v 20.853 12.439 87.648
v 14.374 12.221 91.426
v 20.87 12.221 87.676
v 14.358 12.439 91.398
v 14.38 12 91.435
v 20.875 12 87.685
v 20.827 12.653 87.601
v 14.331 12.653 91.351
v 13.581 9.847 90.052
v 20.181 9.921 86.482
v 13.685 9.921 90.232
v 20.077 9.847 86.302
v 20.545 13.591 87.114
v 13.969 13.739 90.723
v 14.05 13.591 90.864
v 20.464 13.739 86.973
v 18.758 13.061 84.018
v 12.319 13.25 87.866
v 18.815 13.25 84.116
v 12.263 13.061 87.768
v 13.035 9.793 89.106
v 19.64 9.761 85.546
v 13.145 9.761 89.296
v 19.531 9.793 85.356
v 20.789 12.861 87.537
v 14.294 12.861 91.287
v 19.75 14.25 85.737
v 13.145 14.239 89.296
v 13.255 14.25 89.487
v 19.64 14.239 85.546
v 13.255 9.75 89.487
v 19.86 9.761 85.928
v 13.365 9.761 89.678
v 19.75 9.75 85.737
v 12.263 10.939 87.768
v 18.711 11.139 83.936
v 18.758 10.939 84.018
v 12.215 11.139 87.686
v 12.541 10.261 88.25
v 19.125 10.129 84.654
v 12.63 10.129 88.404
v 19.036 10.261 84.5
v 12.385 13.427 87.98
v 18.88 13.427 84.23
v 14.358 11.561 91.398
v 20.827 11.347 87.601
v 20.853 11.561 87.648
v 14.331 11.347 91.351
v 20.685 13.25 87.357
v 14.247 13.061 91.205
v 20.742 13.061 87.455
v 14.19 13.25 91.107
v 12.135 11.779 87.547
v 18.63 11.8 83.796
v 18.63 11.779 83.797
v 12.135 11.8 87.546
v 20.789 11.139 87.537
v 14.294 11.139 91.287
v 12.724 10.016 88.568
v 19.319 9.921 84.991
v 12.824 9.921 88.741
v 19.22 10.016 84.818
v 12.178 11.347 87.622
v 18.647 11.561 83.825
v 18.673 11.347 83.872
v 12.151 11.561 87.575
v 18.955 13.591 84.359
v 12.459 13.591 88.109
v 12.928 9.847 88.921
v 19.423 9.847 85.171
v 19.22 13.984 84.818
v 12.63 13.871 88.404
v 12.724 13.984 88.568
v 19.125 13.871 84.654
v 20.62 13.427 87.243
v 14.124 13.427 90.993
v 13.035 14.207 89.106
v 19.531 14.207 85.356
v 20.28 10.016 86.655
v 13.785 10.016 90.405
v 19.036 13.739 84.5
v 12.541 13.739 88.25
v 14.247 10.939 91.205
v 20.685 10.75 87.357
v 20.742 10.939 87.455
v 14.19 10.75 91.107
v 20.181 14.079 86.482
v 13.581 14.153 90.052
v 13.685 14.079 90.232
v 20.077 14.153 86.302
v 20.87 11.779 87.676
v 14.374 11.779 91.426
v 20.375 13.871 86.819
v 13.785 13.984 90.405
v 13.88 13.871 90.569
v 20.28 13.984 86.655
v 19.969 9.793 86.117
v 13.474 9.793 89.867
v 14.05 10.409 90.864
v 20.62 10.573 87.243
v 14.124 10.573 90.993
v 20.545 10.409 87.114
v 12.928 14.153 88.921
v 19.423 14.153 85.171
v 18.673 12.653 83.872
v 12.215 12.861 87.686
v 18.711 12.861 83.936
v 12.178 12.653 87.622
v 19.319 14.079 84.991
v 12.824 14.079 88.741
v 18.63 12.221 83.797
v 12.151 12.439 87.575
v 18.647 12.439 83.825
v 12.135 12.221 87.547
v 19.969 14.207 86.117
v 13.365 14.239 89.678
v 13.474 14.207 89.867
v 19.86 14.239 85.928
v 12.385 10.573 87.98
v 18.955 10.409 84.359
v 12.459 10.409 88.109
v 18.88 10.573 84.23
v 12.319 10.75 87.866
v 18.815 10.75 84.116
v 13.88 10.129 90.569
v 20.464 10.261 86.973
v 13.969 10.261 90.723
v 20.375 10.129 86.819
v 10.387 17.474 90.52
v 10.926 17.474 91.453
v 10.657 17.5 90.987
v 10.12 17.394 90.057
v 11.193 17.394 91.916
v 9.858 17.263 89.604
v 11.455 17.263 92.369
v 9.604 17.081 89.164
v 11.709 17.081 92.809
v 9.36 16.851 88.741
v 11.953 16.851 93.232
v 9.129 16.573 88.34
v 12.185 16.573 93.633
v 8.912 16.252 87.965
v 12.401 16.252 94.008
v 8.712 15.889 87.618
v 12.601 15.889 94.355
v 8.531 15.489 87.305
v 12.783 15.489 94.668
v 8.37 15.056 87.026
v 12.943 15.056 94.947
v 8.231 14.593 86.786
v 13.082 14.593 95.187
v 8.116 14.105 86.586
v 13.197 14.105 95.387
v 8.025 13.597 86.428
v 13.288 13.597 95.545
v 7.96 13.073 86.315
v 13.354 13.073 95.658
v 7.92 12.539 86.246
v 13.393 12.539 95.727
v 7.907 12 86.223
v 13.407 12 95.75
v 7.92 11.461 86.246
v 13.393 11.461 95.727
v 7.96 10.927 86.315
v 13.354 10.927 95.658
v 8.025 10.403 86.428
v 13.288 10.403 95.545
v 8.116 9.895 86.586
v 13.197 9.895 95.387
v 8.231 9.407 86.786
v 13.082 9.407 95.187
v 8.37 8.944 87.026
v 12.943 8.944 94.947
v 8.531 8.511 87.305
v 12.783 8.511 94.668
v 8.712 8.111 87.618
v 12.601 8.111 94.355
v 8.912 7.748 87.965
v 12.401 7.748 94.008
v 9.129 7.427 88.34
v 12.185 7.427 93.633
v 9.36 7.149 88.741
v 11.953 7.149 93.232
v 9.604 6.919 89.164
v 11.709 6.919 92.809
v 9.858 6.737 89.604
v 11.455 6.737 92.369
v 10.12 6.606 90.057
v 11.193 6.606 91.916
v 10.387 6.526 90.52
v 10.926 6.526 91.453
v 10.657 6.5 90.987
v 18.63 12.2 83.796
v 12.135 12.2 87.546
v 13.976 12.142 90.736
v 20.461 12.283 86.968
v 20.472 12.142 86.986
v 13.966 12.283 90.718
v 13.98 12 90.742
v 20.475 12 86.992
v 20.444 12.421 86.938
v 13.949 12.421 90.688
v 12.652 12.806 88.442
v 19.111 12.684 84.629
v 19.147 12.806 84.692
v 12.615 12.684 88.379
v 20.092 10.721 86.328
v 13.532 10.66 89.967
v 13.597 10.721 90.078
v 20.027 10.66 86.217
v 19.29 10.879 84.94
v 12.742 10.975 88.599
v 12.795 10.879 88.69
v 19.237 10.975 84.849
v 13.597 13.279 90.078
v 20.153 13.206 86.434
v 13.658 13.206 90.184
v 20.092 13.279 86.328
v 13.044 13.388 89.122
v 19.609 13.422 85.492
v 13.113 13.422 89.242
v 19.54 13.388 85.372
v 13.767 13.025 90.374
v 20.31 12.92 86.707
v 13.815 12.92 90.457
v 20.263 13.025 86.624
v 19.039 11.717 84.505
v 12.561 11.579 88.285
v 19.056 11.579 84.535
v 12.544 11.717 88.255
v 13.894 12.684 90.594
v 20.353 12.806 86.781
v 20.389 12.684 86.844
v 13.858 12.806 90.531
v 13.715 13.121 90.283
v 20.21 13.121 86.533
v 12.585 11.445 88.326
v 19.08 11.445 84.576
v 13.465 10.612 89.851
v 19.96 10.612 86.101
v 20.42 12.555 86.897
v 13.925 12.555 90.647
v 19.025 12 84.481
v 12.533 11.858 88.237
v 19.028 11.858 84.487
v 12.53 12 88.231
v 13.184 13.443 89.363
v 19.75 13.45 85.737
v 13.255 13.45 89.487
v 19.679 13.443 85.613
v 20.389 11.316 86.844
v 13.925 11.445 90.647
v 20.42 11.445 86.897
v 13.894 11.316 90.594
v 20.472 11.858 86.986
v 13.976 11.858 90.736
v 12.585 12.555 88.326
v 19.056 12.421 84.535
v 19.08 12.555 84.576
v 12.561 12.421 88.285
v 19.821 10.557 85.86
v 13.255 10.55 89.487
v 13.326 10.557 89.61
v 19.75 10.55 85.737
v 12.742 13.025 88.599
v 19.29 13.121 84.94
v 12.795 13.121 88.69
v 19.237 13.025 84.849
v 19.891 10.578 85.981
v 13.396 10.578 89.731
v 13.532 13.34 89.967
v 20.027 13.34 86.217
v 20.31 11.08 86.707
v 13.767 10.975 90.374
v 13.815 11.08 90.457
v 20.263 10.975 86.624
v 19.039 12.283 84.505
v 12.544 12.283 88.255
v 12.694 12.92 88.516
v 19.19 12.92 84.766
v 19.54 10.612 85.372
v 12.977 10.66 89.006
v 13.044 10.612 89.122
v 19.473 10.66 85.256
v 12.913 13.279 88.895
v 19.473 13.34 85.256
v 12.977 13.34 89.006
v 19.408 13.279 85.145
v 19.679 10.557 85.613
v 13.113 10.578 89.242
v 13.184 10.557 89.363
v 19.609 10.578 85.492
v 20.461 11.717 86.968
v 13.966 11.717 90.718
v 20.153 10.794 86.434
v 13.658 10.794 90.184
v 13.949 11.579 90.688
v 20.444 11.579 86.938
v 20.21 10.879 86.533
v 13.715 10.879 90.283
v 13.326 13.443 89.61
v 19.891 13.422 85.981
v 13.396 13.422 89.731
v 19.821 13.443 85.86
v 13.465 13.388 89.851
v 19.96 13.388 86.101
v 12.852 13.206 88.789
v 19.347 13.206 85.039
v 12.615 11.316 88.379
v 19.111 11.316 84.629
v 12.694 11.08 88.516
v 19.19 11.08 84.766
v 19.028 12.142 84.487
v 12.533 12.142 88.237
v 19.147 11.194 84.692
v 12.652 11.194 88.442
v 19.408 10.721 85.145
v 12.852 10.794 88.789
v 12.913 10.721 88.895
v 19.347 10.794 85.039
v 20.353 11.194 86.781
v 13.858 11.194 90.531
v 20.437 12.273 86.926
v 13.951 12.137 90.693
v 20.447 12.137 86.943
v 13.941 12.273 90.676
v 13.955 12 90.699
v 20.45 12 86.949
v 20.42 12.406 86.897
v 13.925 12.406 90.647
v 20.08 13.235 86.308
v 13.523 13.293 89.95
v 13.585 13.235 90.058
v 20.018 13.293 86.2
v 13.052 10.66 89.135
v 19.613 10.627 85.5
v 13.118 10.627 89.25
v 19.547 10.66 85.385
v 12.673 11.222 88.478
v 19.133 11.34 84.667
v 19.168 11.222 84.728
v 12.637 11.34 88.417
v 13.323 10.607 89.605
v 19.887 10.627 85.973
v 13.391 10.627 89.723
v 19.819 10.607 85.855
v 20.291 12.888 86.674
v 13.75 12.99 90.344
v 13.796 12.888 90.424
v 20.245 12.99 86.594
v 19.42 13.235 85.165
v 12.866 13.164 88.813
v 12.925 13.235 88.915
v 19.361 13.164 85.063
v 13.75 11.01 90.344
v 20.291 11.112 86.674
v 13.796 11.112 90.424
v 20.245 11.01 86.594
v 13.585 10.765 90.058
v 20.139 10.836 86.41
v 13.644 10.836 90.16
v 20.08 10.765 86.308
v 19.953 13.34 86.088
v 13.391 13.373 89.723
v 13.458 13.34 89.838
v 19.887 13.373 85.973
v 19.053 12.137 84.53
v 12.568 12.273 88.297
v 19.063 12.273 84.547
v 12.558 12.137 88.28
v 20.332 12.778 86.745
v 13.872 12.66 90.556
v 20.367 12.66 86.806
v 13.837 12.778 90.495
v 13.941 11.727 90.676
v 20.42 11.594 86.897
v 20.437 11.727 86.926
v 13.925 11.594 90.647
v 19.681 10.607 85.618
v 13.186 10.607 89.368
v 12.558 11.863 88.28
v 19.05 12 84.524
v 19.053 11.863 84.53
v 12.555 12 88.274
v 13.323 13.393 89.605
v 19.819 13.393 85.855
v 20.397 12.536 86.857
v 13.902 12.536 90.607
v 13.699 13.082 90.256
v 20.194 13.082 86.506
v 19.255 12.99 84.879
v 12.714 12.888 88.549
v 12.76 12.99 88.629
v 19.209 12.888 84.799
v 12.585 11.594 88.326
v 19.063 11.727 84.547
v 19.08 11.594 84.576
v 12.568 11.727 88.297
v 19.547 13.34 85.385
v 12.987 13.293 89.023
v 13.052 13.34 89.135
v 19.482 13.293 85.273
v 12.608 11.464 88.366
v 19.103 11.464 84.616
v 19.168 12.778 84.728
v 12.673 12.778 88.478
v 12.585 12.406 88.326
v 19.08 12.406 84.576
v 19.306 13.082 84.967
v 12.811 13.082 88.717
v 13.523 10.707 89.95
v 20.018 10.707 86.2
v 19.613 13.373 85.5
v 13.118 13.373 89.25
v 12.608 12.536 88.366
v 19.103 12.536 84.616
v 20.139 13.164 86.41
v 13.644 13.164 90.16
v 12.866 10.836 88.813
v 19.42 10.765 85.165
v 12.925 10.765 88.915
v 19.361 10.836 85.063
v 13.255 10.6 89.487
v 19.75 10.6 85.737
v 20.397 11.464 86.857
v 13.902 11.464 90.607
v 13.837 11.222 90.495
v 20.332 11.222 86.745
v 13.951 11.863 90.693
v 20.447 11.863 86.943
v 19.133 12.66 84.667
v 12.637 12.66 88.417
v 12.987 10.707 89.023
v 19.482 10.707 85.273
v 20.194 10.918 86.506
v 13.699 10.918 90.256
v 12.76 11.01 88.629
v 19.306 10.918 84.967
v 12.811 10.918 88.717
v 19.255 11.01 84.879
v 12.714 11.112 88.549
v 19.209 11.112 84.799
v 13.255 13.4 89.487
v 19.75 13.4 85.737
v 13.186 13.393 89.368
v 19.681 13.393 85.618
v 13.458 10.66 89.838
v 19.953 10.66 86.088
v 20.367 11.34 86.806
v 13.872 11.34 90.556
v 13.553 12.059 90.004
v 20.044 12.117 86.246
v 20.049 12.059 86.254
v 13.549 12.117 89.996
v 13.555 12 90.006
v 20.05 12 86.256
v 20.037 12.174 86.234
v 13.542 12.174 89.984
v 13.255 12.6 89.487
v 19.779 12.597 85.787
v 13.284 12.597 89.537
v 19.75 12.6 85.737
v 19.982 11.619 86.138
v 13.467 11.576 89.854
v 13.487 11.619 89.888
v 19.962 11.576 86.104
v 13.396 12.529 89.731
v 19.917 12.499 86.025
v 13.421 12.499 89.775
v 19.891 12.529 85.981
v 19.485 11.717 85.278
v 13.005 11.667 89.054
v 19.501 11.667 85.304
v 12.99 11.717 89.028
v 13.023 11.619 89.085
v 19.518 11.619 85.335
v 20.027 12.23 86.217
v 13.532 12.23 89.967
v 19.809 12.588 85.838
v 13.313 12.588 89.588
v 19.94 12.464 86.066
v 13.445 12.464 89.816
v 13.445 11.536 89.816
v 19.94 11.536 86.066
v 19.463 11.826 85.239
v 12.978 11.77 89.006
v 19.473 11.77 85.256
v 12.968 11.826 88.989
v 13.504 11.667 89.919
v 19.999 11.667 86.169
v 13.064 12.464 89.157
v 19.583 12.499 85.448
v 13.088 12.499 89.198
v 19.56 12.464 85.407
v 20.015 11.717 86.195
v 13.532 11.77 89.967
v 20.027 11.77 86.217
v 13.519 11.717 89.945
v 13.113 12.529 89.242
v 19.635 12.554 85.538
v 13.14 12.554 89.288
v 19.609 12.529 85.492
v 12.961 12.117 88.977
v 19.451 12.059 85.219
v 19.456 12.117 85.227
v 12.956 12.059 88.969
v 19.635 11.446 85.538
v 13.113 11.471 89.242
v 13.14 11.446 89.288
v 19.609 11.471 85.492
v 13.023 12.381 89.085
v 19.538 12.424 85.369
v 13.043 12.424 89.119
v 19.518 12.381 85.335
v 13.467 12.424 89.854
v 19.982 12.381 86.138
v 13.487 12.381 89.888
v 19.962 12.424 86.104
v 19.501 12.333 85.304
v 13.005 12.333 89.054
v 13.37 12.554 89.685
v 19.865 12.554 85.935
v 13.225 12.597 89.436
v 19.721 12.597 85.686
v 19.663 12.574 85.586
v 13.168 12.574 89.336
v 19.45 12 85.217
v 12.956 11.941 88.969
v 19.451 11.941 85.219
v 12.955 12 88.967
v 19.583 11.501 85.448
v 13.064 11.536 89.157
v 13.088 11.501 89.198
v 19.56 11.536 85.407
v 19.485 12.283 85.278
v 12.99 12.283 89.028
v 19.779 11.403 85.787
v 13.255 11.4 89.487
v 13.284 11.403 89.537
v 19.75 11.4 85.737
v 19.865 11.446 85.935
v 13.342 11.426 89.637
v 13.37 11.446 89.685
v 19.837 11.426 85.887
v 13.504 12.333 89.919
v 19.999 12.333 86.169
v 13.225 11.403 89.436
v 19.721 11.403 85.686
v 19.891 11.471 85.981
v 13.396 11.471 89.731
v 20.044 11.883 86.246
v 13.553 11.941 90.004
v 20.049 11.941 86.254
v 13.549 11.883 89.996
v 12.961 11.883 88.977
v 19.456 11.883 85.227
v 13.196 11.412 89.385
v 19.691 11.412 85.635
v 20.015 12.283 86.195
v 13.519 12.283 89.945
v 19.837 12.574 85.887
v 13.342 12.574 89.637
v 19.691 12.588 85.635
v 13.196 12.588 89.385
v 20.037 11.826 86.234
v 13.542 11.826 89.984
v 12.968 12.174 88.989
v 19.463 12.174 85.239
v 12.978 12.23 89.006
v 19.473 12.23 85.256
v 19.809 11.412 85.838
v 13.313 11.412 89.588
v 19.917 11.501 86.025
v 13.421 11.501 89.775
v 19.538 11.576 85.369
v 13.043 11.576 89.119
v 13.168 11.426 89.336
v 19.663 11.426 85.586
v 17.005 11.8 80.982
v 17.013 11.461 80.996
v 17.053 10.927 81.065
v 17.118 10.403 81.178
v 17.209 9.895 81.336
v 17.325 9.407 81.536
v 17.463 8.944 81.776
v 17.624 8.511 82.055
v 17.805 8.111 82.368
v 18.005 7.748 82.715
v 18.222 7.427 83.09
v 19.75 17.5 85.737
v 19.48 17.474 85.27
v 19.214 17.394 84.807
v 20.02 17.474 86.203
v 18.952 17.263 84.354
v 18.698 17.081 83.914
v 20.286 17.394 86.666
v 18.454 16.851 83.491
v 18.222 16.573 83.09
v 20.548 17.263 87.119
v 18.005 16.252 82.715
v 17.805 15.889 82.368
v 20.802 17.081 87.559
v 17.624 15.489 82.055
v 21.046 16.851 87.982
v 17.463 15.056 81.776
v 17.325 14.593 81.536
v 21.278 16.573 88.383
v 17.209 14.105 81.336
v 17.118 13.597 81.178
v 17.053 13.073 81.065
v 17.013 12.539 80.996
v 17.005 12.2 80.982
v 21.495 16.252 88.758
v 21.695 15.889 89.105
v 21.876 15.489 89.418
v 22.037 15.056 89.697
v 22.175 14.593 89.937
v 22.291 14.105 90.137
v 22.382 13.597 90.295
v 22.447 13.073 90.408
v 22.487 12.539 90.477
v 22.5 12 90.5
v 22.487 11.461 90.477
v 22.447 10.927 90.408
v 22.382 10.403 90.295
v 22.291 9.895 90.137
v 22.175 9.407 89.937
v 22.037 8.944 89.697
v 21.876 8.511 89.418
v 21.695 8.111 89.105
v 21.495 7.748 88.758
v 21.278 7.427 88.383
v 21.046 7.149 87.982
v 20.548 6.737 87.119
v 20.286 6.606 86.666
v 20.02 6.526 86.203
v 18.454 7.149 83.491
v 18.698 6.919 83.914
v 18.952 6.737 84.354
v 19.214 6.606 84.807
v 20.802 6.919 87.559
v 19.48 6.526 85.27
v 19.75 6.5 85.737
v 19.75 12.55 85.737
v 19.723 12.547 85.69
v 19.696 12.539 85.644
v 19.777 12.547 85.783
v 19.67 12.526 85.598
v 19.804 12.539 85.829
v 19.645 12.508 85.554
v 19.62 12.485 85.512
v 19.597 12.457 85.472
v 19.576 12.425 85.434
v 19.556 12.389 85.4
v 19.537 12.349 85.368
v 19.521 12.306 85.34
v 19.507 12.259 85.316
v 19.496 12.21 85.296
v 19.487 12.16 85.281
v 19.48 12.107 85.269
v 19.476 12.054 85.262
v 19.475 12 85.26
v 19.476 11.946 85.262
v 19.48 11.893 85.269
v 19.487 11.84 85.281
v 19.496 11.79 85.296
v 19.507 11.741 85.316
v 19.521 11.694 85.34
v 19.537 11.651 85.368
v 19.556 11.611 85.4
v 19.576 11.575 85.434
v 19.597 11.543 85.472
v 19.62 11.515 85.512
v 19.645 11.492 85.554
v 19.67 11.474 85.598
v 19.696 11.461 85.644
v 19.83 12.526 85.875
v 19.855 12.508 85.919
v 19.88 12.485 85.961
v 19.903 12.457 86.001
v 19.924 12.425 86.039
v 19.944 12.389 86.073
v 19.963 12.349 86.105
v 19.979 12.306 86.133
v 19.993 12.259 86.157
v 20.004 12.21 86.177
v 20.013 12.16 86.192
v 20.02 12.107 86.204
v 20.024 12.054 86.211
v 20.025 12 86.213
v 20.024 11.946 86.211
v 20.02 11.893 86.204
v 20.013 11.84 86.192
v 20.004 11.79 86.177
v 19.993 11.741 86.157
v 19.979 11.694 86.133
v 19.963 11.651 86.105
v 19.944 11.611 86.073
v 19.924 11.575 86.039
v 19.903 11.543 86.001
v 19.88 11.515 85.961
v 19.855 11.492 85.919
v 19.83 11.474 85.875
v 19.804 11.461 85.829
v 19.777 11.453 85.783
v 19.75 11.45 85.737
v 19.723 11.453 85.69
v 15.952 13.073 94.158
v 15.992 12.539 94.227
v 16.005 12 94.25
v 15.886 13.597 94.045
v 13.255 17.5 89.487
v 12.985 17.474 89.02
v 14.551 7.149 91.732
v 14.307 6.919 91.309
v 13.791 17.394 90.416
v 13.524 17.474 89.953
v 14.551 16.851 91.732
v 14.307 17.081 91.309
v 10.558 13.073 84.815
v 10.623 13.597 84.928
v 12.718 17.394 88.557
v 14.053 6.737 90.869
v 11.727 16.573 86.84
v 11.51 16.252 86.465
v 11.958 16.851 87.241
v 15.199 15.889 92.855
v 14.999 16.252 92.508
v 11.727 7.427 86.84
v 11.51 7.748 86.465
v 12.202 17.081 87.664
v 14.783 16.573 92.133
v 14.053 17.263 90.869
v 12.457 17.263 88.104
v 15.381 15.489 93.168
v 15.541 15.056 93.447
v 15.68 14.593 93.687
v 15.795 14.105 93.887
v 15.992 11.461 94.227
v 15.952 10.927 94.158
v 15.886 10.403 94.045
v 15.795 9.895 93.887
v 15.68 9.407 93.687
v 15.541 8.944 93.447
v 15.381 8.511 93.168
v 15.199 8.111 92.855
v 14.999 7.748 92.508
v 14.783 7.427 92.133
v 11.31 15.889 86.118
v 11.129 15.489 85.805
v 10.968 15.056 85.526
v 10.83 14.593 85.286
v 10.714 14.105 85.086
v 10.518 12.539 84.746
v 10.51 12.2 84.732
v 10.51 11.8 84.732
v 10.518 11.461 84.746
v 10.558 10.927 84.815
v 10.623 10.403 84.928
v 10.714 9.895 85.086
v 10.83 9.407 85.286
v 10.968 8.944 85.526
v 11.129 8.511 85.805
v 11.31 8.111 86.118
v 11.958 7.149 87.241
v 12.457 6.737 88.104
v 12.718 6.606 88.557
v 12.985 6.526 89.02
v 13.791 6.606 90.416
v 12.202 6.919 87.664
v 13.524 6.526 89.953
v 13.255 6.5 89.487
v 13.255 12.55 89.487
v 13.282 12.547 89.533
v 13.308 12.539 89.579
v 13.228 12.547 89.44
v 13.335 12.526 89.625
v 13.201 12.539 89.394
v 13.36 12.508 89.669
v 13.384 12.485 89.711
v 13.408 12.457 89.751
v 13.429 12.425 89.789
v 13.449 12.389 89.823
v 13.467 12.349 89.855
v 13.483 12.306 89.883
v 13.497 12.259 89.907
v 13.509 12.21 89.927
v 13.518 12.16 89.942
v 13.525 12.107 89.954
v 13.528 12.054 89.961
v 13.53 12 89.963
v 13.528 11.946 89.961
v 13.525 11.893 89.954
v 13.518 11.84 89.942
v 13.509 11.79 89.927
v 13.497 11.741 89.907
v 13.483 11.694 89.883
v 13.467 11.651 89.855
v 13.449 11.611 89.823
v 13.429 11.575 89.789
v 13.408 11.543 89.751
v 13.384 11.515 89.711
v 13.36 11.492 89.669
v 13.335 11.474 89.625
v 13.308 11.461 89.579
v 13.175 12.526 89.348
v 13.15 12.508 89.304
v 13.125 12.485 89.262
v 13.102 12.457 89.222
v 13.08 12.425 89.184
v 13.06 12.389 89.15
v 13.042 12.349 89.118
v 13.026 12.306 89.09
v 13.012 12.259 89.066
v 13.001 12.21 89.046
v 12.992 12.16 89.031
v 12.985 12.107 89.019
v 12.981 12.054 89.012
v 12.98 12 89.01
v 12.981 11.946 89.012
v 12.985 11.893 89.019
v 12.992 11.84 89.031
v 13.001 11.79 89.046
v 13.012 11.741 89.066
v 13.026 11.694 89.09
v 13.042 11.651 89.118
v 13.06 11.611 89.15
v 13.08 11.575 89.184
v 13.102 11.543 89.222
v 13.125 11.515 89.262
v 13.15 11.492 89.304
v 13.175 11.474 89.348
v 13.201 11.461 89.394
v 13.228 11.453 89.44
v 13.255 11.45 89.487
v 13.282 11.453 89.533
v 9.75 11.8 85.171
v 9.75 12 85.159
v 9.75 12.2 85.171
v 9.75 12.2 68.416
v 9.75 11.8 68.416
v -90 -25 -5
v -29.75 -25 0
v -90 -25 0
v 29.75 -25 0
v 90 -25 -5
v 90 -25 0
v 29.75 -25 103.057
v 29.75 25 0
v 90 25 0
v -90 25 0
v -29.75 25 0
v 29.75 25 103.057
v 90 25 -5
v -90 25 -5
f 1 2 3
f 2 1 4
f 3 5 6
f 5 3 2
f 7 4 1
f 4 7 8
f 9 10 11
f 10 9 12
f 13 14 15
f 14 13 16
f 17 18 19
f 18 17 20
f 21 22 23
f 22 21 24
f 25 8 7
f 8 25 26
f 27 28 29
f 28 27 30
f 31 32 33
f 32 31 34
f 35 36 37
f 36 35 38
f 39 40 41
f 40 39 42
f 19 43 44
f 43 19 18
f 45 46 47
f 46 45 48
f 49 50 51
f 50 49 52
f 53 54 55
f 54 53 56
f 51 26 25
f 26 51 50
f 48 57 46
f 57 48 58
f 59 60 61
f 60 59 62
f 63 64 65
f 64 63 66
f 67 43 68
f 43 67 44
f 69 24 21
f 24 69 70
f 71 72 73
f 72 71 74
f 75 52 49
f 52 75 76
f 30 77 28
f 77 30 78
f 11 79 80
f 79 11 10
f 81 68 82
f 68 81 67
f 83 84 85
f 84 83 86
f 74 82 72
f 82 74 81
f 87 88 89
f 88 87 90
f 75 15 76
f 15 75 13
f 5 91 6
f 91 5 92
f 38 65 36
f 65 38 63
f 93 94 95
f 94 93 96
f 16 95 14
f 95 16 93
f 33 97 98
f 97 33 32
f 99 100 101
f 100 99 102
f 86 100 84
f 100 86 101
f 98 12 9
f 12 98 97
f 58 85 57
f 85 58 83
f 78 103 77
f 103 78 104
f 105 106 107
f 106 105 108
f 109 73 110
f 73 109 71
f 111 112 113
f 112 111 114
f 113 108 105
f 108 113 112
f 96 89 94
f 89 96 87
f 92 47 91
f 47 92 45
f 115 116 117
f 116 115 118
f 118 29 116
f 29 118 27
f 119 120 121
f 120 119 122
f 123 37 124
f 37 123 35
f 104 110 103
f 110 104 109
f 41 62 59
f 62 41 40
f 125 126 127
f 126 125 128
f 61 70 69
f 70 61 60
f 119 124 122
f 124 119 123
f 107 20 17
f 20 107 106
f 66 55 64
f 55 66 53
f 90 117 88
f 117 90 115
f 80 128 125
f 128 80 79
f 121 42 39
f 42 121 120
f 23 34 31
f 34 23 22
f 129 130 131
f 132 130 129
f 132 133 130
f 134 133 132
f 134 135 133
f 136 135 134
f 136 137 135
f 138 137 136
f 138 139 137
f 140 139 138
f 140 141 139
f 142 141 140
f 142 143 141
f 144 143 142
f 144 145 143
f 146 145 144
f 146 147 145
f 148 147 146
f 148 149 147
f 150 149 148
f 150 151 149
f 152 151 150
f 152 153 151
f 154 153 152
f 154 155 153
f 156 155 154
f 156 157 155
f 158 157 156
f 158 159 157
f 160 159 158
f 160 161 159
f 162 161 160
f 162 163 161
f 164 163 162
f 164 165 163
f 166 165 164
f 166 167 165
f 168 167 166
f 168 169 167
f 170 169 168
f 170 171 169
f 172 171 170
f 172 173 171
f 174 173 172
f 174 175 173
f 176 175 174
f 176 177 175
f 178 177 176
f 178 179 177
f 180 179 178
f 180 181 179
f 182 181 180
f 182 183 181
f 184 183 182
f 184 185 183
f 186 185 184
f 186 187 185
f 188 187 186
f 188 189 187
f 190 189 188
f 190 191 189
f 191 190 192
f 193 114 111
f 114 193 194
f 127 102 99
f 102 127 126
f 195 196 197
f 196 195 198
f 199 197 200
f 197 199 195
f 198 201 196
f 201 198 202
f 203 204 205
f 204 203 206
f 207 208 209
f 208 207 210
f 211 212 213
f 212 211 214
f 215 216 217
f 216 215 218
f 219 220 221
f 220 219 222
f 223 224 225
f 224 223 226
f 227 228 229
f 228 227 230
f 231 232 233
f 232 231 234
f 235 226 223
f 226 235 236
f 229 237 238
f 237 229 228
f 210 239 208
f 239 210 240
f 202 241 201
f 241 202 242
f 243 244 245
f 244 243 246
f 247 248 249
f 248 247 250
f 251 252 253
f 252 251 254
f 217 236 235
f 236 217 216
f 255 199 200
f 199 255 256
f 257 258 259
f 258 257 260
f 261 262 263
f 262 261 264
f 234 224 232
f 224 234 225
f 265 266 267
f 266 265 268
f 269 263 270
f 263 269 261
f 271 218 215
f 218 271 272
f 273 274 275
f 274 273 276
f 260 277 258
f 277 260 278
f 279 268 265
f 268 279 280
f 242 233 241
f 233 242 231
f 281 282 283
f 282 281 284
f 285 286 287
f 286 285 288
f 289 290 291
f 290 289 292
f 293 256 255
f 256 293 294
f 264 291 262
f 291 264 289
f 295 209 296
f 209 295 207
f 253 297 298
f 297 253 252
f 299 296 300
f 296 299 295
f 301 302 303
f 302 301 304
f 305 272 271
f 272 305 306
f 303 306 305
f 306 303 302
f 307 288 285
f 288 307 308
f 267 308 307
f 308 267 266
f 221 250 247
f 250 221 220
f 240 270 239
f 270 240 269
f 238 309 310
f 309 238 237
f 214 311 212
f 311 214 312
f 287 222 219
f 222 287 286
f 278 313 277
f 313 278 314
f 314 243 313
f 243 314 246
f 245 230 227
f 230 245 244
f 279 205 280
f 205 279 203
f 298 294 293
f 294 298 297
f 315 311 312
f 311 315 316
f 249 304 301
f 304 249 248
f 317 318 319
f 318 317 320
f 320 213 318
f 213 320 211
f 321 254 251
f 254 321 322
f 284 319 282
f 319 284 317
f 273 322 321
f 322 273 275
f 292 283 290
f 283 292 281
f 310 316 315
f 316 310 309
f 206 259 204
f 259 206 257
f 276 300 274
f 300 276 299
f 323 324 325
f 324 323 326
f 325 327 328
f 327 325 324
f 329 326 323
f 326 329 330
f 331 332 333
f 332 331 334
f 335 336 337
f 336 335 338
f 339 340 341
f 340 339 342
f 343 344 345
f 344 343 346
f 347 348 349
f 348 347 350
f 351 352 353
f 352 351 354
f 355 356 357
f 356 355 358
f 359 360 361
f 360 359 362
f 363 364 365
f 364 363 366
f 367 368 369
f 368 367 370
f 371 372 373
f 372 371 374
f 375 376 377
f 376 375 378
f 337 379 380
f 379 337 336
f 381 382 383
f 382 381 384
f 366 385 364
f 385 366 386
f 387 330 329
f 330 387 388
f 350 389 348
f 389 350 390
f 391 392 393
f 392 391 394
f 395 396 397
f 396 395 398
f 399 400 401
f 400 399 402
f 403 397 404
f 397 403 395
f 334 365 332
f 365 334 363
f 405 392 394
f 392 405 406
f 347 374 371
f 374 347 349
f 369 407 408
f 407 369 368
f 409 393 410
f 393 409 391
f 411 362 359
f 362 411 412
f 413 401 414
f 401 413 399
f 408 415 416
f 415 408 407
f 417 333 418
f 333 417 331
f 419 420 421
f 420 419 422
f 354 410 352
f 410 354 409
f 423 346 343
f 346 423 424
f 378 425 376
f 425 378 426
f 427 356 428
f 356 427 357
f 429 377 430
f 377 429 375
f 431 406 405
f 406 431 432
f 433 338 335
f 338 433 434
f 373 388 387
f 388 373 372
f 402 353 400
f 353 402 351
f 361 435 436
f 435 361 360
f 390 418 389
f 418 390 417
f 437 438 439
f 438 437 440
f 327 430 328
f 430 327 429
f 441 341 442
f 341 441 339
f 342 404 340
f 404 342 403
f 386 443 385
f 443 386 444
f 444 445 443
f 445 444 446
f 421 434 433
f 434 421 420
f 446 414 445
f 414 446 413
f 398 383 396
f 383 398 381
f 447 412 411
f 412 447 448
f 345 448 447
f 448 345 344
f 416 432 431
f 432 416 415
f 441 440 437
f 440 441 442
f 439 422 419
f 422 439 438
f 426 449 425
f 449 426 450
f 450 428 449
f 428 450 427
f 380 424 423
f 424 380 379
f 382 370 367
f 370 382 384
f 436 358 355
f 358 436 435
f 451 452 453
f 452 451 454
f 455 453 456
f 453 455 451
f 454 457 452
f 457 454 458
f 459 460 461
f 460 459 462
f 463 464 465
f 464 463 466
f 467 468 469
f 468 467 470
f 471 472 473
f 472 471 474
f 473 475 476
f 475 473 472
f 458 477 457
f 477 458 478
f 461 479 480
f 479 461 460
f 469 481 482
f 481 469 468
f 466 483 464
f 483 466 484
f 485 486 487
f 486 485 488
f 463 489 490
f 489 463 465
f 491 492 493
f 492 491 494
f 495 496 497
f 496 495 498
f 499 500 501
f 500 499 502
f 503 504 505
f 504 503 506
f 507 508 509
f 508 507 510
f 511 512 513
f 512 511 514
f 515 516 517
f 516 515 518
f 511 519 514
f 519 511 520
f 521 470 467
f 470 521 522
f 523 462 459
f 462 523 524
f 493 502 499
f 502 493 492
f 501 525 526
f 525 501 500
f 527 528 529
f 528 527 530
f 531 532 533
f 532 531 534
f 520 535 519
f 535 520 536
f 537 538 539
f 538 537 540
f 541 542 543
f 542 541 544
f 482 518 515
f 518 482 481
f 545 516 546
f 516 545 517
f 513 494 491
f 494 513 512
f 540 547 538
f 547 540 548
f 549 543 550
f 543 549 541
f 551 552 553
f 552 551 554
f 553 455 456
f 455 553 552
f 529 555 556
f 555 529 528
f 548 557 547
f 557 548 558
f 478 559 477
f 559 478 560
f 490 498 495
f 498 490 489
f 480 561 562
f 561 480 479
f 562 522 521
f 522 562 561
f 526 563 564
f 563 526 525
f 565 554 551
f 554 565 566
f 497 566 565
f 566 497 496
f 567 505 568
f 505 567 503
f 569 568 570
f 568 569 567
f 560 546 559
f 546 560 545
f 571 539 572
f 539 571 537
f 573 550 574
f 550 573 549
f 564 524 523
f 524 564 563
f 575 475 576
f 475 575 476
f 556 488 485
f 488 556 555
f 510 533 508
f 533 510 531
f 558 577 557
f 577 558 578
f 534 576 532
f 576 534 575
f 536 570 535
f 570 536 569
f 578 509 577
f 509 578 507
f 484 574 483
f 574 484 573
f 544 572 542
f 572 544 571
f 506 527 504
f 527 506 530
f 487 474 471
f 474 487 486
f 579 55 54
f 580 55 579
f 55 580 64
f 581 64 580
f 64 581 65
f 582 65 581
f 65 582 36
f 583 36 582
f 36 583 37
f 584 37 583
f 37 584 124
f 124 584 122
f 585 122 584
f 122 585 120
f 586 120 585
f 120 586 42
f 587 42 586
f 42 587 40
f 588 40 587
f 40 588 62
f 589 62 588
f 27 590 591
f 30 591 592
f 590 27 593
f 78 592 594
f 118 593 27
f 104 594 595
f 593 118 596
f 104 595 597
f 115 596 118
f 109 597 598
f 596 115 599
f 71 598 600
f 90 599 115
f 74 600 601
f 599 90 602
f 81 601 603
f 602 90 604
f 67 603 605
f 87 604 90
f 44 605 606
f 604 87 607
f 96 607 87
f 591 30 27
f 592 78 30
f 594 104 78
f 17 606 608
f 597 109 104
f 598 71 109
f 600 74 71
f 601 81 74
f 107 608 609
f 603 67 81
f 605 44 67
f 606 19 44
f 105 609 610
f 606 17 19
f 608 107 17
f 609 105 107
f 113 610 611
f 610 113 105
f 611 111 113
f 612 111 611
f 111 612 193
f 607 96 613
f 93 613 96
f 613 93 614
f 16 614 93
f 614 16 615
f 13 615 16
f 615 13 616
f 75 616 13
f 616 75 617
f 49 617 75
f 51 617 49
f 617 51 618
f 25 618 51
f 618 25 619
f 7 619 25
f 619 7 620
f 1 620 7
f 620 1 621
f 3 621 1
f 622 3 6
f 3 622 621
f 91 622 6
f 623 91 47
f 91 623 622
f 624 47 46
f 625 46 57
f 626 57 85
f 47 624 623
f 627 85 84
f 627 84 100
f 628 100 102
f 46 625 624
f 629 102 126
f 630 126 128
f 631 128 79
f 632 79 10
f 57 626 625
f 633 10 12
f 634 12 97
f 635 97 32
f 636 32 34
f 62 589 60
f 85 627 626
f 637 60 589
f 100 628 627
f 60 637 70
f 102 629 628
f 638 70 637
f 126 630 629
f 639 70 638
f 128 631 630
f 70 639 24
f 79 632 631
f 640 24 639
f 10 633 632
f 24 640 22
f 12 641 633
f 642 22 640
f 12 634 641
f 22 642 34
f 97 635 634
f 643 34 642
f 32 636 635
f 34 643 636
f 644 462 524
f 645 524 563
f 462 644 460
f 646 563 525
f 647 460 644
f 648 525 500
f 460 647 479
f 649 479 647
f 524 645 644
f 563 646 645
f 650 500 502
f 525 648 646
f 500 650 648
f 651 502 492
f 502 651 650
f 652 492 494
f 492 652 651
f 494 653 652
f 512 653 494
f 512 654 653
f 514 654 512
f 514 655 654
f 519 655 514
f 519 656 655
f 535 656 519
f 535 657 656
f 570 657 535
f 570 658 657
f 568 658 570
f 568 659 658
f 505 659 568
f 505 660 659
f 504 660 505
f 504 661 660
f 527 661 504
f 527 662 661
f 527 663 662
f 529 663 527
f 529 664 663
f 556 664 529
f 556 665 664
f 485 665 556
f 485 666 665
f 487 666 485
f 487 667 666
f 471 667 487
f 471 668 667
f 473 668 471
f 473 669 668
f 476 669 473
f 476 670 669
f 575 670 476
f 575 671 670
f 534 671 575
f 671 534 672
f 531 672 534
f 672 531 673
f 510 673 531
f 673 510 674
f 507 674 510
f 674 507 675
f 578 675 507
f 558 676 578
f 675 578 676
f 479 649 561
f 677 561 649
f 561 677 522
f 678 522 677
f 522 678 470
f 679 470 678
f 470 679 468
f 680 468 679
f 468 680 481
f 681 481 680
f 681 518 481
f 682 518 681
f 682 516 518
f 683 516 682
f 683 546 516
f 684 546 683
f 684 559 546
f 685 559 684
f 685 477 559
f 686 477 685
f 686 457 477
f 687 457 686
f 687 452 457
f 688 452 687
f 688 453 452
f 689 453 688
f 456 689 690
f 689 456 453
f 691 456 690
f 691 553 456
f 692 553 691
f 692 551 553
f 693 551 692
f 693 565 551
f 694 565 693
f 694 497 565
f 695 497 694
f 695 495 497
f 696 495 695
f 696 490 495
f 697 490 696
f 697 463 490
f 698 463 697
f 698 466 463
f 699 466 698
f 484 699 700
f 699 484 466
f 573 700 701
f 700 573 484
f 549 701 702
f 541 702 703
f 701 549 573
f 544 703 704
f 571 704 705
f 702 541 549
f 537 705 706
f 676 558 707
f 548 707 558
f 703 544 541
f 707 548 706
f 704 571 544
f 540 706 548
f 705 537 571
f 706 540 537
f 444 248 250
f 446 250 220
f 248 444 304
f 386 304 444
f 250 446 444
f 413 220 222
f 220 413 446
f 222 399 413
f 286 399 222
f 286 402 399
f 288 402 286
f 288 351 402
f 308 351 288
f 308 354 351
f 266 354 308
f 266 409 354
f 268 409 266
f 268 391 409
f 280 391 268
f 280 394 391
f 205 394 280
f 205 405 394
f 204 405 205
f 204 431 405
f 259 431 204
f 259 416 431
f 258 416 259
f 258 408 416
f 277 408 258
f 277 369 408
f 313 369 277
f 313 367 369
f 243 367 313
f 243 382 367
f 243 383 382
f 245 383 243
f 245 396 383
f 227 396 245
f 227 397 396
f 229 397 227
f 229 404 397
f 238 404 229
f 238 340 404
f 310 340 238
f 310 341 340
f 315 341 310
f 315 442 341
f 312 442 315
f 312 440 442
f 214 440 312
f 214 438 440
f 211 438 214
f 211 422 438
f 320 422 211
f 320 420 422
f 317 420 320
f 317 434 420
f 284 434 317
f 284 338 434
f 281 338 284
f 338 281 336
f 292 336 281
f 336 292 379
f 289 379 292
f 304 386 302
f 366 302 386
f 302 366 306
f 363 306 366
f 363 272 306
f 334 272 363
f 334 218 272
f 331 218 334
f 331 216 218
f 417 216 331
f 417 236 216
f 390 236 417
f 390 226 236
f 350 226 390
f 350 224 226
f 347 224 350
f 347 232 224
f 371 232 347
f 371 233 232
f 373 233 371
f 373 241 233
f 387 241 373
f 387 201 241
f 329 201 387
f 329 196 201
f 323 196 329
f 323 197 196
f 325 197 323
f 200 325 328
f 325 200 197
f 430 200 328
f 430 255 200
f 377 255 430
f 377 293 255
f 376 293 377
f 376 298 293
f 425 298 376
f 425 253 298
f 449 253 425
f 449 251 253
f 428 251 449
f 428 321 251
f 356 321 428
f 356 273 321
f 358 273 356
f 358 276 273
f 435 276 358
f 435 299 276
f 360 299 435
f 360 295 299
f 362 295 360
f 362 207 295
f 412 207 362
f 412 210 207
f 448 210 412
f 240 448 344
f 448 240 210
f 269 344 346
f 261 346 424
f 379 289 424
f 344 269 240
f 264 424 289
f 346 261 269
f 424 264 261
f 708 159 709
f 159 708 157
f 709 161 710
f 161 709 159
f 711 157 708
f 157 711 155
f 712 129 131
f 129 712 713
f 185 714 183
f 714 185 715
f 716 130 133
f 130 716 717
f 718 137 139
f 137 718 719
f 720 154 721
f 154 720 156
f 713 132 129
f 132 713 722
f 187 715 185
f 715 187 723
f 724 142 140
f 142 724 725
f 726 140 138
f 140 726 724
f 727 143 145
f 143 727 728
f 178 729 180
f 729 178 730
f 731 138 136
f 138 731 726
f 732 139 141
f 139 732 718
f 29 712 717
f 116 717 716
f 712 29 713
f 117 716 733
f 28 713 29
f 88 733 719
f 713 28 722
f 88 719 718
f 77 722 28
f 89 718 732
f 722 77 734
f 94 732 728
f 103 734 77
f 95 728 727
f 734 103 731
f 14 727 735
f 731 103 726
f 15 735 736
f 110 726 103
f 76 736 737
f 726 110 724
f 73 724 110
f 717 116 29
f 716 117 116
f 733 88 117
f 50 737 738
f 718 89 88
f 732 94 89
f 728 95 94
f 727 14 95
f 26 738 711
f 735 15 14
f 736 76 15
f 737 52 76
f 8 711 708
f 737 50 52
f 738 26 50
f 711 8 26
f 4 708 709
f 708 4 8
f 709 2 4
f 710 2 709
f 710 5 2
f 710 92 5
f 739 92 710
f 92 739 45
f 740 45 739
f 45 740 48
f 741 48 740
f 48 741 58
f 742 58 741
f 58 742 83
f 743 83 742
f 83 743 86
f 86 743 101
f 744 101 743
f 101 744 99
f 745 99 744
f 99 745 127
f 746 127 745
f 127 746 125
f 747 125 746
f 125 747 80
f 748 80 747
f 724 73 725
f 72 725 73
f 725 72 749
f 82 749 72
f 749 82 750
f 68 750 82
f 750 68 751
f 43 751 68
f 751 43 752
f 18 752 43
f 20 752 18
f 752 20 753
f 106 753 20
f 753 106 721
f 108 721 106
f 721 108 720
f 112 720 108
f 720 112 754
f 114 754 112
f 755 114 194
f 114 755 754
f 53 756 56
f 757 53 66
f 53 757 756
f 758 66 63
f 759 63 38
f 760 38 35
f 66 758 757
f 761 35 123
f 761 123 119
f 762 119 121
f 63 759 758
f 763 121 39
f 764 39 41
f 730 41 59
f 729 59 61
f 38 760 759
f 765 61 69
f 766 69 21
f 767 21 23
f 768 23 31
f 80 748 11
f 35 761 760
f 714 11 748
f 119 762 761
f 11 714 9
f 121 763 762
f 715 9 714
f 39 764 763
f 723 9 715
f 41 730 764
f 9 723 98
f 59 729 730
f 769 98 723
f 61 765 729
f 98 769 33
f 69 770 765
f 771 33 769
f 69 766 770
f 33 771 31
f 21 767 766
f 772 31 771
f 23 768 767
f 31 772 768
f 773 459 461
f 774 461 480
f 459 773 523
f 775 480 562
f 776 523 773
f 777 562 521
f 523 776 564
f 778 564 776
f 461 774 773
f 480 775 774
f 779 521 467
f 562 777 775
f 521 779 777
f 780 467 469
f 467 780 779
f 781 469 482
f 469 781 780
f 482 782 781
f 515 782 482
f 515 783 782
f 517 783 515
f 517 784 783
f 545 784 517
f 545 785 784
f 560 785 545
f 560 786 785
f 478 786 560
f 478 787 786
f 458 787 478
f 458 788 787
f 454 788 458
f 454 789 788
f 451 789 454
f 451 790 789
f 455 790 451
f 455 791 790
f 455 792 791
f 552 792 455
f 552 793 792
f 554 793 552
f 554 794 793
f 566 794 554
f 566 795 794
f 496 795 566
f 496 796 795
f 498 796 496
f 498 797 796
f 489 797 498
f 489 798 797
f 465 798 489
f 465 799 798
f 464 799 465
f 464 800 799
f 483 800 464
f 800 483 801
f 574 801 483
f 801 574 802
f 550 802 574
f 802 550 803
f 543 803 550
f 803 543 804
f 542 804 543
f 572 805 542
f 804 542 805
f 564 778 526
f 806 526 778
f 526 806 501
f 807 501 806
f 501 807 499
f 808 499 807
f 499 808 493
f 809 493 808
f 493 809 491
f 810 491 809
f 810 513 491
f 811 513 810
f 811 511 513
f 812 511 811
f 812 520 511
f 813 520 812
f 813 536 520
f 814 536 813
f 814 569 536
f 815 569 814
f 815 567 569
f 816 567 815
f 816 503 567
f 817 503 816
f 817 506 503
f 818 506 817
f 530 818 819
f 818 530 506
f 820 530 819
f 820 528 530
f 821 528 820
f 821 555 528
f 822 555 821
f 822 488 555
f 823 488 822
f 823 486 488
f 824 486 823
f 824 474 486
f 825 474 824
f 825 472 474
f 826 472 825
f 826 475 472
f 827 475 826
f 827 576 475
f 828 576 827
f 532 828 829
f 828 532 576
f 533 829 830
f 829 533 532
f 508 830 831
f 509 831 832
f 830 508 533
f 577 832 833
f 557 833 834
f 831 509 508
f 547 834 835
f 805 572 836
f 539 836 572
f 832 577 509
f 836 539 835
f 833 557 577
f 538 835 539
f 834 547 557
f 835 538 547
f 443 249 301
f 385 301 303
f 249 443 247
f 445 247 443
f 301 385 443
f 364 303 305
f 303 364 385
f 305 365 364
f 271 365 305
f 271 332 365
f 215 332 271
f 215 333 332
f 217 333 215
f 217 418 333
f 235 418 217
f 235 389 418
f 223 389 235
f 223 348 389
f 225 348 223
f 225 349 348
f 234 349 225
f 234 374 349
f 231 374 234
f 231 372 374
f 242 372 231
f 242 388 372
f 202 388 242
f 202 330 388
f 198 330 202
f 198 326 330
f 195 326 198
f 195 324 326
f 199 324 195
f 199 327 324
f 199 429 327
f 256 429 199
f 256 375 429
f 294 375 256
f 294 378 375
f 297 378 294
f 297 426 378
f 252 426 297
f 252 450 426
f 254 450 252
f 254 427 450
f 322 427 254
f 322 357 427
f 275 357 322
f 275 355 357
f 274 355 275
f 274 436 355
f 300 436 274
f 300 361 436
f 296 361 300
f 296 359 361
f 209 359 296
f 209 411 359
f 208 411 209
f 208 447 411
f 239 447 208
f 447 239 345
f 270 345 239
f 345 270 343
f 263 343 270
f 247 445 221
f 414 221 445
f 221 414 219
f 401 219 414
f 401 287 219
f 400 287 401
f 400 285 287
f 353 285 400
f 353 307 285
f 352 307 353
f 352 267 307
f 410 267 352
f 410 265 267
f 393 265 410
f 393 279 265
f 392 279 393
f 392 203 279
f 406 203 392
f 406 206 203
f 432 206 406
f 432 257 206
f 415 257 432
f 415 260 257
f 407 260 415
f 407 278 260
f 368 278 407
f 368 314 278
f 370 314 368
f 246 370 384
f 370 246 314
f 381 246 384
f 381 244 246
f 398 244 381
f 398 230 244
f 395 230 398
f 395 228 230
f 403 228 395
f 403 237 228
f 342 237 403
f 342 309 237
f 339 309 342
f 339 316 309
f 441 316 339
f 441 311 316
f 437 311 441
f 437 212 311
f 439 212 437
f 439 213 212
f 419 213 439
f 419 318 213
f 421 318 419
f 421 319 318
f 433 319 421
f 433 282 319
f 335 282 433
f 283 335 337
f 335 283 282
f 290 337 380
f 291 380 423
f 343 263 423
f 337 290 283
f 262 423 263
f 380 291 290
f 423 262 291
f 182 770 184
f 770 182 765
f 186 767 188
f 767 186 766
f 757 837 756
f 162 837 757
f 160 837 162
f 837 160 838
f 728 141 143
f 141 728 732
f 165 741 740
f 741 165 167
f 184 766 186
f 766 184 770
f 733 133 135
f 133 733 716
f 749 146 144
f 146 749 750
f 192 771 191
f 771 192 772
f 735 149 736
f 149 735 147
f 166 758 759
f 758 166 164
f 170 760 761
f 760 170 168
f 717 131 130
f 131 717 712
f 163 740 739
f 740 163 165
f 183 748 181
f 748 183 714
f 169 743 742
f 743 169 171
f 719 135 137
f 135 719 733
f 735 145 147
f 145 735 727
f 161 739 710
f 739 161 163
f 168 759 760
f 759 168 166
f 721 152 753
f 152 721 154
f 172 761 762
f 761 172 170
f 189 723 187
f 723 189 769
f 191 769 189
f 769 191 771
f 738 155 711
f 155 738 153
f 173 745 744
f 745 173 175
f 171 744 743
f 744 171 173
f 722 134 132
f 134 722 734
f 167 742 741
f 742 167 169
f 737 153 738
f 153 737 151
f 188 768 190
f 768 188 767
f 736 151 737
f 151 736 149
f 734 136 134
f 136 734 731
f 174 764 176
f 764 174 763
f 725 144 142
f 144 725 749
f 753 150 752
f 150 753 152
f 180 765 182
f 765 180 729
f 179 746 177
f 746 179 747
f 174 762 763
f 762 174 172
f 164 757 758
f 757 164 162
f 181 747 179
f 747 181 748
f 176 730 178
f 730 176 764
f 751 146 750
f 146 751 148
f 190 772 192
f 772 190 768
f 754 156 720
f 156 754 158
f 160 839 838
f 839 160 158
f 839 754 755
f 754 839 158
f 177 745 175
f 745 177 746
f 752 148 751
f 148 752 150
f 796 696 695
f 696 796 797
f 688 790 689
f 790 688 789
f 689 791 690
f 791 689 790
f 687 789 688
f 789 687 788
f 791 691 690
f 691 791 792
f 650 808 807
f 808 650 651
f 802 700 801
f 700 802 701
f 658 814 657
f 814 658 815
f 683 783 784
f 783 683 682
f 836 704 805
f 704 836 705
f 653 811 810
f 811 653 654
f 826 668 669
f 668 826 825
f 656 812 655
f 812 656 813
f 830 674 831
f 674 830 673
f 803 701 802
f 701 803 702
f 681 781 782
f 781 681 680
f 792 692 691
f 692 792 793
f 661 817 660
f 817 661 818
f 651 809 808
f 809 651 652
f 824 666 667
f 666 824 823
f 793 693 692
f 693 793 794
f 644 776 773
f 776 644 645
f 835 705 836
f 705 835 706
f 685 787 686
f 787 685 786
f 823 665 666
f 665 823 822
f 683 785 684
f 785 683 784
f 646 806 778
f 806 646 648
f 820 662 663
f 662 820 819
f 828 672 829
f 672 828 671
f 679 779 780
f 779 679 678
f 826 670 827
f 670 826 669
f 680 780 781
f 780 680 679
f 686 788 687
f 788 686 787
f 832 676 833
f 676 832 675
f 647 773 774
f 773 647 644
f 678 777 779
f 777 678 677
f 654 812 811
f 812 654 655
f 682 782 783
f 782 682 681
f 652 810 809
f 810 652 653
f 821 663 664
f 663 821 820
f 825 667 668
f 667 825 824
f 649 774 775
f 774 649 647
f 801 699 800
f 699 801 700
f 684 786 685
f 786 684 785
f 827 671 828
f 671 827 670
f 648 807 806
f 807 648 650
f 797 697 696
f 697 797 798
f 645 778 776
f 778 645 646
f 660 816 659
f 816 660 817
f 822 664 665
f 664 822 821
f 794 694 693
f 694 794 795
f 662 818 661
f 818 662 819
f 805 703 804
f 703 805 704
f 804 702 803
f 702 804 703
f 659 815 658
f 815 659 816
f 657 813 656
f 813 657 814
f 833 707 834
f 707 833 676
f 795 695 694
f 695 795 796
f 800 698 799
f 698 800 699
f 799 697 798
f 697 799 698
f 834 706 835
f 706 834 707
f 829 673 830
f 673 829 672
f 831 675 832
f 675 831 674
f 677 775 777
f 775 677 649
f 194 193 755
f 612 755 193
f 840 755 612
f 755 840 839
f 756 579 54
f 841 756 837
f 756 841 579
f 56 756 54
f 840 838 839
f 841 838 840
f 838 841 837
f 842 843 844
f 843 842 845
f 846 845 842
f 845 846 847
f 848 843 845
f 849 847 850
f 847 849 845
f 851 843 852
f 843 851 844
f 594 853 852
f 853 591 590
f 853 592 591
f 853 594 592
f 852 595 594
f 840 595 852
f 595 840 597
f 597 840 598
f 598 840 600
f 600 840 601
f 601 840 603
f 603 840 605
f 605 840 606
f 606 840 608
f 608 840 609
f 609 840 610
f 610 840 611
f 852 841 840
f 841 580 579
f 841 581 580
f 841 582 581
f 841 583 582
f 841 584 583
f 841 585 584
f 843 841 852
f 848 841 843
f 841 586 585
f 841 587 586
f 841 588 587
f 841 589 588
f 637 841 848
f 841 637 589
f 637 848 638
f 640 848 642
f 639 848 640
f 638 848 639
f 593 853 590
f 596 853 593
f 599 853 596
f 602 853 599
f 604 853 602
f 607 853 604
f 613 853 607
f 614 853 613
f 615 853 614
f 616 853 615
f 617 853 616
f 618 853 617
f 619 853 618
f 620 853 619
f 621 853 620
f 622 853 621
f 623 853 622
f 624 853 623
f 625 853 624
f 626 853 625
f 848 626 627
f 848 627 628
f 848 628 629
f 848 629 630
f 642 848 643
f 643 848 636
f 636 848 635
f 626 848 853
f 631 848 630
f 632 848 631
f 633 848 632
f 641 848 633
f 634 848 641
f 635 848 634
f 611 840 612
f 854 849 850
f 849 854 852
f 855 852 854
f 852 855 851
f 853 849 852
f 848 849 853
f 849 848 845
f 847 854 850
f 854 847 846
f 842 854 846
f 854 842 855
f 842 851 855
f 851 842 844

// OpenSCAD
// file: screwhang.scad
module screwhang()
{
    translate([0,0,-1.5])cylinder(d=11, h=3,center=true, $fn=64);
    translate([0,0,9])cylinder(d=11, h=3,center=true, $fn=64);

    // Trick to make a solid center cylinder
    difference()
    {
        translate([0,0,4.5])cylinder(d=4.5, h=12, center=true, $fn=64);
        translate([0,0,4.5])cylinder(d=2.9, h=12, center=true, $fn=64);
    }
    difference()
    {
        translate([0,0,4.5])cylinder(d=2.8, h=12, center=true, $fn=64);
        translate([0,0,4.5])cylinder(d=1.2, h=12, center=true, $fn=64);
    }
    translate([0,0,4.5])cylinder(d=1.1, h=12, center=true, $fn=64);


}

screwhang();
// main file
use <screwhang.scad>

thickness=1;
footLength=180;
footWidth=50;
footThick=5;
hangHeight=99;
leanDegree=30;

module right_angle_prism(l, w, h) {
    linear_extrude(height = h) {
        polygon(points=[[0,0],[l,0],[0,w]], paths=[[0,1,2]]);
    }
}

module back(hangHeight=hangHeight, leanDegree=leanDegree)
{
    backLength=hangHeight+20;
    //translate([0,0,60])cube([thickness,30,backLength],center=true);
    
    translate([backLength*sin(leanDegree)/2,-footWidth/2,0])rotate([90,0,180])right_angle_prism(backLength*sin(leanDegree),cos(leanDegree)*backLength,footWidth);}

module foot()
{
    translate([0,0,-footThick/2])cube([footLength,footWidth,footThick],center=true);    
}

module supportWall()
{
    supportThickness=0.4;
    translate([0,supportThickness/2,0])rotate([90,0,0])right_angle_prism(11*cos(leanDegree),11*sin(leanDegree),supportThickness);
    translate([11/2,0,-10])cube([11,supportThickness,20],center=true);
}
module leaningFoot(side="left")
{
    hangOffset = (side=="left") ? -12 : 12;
        
    back();
    knobAdjust=5;
    translate([hangHeight*sin(leanDegree)/2-knobAdjust,hangOffset,cos(leanDegree)*hangHeight])rotate([0,leanDegree-90,0])screwhang();
    translate([hangHeight*sin(leanDegree)/2-15,hangOffset,cos(leanDegree)*hangHeight-2])supportWall();
    foot();
    

}

difference()
{
leaningFoot(side="right");
//    translate([0,-102,0])cube([200,200,300],center=true);
//    translate([0,100.2,0])cube([200,200,300],center=true);
}
